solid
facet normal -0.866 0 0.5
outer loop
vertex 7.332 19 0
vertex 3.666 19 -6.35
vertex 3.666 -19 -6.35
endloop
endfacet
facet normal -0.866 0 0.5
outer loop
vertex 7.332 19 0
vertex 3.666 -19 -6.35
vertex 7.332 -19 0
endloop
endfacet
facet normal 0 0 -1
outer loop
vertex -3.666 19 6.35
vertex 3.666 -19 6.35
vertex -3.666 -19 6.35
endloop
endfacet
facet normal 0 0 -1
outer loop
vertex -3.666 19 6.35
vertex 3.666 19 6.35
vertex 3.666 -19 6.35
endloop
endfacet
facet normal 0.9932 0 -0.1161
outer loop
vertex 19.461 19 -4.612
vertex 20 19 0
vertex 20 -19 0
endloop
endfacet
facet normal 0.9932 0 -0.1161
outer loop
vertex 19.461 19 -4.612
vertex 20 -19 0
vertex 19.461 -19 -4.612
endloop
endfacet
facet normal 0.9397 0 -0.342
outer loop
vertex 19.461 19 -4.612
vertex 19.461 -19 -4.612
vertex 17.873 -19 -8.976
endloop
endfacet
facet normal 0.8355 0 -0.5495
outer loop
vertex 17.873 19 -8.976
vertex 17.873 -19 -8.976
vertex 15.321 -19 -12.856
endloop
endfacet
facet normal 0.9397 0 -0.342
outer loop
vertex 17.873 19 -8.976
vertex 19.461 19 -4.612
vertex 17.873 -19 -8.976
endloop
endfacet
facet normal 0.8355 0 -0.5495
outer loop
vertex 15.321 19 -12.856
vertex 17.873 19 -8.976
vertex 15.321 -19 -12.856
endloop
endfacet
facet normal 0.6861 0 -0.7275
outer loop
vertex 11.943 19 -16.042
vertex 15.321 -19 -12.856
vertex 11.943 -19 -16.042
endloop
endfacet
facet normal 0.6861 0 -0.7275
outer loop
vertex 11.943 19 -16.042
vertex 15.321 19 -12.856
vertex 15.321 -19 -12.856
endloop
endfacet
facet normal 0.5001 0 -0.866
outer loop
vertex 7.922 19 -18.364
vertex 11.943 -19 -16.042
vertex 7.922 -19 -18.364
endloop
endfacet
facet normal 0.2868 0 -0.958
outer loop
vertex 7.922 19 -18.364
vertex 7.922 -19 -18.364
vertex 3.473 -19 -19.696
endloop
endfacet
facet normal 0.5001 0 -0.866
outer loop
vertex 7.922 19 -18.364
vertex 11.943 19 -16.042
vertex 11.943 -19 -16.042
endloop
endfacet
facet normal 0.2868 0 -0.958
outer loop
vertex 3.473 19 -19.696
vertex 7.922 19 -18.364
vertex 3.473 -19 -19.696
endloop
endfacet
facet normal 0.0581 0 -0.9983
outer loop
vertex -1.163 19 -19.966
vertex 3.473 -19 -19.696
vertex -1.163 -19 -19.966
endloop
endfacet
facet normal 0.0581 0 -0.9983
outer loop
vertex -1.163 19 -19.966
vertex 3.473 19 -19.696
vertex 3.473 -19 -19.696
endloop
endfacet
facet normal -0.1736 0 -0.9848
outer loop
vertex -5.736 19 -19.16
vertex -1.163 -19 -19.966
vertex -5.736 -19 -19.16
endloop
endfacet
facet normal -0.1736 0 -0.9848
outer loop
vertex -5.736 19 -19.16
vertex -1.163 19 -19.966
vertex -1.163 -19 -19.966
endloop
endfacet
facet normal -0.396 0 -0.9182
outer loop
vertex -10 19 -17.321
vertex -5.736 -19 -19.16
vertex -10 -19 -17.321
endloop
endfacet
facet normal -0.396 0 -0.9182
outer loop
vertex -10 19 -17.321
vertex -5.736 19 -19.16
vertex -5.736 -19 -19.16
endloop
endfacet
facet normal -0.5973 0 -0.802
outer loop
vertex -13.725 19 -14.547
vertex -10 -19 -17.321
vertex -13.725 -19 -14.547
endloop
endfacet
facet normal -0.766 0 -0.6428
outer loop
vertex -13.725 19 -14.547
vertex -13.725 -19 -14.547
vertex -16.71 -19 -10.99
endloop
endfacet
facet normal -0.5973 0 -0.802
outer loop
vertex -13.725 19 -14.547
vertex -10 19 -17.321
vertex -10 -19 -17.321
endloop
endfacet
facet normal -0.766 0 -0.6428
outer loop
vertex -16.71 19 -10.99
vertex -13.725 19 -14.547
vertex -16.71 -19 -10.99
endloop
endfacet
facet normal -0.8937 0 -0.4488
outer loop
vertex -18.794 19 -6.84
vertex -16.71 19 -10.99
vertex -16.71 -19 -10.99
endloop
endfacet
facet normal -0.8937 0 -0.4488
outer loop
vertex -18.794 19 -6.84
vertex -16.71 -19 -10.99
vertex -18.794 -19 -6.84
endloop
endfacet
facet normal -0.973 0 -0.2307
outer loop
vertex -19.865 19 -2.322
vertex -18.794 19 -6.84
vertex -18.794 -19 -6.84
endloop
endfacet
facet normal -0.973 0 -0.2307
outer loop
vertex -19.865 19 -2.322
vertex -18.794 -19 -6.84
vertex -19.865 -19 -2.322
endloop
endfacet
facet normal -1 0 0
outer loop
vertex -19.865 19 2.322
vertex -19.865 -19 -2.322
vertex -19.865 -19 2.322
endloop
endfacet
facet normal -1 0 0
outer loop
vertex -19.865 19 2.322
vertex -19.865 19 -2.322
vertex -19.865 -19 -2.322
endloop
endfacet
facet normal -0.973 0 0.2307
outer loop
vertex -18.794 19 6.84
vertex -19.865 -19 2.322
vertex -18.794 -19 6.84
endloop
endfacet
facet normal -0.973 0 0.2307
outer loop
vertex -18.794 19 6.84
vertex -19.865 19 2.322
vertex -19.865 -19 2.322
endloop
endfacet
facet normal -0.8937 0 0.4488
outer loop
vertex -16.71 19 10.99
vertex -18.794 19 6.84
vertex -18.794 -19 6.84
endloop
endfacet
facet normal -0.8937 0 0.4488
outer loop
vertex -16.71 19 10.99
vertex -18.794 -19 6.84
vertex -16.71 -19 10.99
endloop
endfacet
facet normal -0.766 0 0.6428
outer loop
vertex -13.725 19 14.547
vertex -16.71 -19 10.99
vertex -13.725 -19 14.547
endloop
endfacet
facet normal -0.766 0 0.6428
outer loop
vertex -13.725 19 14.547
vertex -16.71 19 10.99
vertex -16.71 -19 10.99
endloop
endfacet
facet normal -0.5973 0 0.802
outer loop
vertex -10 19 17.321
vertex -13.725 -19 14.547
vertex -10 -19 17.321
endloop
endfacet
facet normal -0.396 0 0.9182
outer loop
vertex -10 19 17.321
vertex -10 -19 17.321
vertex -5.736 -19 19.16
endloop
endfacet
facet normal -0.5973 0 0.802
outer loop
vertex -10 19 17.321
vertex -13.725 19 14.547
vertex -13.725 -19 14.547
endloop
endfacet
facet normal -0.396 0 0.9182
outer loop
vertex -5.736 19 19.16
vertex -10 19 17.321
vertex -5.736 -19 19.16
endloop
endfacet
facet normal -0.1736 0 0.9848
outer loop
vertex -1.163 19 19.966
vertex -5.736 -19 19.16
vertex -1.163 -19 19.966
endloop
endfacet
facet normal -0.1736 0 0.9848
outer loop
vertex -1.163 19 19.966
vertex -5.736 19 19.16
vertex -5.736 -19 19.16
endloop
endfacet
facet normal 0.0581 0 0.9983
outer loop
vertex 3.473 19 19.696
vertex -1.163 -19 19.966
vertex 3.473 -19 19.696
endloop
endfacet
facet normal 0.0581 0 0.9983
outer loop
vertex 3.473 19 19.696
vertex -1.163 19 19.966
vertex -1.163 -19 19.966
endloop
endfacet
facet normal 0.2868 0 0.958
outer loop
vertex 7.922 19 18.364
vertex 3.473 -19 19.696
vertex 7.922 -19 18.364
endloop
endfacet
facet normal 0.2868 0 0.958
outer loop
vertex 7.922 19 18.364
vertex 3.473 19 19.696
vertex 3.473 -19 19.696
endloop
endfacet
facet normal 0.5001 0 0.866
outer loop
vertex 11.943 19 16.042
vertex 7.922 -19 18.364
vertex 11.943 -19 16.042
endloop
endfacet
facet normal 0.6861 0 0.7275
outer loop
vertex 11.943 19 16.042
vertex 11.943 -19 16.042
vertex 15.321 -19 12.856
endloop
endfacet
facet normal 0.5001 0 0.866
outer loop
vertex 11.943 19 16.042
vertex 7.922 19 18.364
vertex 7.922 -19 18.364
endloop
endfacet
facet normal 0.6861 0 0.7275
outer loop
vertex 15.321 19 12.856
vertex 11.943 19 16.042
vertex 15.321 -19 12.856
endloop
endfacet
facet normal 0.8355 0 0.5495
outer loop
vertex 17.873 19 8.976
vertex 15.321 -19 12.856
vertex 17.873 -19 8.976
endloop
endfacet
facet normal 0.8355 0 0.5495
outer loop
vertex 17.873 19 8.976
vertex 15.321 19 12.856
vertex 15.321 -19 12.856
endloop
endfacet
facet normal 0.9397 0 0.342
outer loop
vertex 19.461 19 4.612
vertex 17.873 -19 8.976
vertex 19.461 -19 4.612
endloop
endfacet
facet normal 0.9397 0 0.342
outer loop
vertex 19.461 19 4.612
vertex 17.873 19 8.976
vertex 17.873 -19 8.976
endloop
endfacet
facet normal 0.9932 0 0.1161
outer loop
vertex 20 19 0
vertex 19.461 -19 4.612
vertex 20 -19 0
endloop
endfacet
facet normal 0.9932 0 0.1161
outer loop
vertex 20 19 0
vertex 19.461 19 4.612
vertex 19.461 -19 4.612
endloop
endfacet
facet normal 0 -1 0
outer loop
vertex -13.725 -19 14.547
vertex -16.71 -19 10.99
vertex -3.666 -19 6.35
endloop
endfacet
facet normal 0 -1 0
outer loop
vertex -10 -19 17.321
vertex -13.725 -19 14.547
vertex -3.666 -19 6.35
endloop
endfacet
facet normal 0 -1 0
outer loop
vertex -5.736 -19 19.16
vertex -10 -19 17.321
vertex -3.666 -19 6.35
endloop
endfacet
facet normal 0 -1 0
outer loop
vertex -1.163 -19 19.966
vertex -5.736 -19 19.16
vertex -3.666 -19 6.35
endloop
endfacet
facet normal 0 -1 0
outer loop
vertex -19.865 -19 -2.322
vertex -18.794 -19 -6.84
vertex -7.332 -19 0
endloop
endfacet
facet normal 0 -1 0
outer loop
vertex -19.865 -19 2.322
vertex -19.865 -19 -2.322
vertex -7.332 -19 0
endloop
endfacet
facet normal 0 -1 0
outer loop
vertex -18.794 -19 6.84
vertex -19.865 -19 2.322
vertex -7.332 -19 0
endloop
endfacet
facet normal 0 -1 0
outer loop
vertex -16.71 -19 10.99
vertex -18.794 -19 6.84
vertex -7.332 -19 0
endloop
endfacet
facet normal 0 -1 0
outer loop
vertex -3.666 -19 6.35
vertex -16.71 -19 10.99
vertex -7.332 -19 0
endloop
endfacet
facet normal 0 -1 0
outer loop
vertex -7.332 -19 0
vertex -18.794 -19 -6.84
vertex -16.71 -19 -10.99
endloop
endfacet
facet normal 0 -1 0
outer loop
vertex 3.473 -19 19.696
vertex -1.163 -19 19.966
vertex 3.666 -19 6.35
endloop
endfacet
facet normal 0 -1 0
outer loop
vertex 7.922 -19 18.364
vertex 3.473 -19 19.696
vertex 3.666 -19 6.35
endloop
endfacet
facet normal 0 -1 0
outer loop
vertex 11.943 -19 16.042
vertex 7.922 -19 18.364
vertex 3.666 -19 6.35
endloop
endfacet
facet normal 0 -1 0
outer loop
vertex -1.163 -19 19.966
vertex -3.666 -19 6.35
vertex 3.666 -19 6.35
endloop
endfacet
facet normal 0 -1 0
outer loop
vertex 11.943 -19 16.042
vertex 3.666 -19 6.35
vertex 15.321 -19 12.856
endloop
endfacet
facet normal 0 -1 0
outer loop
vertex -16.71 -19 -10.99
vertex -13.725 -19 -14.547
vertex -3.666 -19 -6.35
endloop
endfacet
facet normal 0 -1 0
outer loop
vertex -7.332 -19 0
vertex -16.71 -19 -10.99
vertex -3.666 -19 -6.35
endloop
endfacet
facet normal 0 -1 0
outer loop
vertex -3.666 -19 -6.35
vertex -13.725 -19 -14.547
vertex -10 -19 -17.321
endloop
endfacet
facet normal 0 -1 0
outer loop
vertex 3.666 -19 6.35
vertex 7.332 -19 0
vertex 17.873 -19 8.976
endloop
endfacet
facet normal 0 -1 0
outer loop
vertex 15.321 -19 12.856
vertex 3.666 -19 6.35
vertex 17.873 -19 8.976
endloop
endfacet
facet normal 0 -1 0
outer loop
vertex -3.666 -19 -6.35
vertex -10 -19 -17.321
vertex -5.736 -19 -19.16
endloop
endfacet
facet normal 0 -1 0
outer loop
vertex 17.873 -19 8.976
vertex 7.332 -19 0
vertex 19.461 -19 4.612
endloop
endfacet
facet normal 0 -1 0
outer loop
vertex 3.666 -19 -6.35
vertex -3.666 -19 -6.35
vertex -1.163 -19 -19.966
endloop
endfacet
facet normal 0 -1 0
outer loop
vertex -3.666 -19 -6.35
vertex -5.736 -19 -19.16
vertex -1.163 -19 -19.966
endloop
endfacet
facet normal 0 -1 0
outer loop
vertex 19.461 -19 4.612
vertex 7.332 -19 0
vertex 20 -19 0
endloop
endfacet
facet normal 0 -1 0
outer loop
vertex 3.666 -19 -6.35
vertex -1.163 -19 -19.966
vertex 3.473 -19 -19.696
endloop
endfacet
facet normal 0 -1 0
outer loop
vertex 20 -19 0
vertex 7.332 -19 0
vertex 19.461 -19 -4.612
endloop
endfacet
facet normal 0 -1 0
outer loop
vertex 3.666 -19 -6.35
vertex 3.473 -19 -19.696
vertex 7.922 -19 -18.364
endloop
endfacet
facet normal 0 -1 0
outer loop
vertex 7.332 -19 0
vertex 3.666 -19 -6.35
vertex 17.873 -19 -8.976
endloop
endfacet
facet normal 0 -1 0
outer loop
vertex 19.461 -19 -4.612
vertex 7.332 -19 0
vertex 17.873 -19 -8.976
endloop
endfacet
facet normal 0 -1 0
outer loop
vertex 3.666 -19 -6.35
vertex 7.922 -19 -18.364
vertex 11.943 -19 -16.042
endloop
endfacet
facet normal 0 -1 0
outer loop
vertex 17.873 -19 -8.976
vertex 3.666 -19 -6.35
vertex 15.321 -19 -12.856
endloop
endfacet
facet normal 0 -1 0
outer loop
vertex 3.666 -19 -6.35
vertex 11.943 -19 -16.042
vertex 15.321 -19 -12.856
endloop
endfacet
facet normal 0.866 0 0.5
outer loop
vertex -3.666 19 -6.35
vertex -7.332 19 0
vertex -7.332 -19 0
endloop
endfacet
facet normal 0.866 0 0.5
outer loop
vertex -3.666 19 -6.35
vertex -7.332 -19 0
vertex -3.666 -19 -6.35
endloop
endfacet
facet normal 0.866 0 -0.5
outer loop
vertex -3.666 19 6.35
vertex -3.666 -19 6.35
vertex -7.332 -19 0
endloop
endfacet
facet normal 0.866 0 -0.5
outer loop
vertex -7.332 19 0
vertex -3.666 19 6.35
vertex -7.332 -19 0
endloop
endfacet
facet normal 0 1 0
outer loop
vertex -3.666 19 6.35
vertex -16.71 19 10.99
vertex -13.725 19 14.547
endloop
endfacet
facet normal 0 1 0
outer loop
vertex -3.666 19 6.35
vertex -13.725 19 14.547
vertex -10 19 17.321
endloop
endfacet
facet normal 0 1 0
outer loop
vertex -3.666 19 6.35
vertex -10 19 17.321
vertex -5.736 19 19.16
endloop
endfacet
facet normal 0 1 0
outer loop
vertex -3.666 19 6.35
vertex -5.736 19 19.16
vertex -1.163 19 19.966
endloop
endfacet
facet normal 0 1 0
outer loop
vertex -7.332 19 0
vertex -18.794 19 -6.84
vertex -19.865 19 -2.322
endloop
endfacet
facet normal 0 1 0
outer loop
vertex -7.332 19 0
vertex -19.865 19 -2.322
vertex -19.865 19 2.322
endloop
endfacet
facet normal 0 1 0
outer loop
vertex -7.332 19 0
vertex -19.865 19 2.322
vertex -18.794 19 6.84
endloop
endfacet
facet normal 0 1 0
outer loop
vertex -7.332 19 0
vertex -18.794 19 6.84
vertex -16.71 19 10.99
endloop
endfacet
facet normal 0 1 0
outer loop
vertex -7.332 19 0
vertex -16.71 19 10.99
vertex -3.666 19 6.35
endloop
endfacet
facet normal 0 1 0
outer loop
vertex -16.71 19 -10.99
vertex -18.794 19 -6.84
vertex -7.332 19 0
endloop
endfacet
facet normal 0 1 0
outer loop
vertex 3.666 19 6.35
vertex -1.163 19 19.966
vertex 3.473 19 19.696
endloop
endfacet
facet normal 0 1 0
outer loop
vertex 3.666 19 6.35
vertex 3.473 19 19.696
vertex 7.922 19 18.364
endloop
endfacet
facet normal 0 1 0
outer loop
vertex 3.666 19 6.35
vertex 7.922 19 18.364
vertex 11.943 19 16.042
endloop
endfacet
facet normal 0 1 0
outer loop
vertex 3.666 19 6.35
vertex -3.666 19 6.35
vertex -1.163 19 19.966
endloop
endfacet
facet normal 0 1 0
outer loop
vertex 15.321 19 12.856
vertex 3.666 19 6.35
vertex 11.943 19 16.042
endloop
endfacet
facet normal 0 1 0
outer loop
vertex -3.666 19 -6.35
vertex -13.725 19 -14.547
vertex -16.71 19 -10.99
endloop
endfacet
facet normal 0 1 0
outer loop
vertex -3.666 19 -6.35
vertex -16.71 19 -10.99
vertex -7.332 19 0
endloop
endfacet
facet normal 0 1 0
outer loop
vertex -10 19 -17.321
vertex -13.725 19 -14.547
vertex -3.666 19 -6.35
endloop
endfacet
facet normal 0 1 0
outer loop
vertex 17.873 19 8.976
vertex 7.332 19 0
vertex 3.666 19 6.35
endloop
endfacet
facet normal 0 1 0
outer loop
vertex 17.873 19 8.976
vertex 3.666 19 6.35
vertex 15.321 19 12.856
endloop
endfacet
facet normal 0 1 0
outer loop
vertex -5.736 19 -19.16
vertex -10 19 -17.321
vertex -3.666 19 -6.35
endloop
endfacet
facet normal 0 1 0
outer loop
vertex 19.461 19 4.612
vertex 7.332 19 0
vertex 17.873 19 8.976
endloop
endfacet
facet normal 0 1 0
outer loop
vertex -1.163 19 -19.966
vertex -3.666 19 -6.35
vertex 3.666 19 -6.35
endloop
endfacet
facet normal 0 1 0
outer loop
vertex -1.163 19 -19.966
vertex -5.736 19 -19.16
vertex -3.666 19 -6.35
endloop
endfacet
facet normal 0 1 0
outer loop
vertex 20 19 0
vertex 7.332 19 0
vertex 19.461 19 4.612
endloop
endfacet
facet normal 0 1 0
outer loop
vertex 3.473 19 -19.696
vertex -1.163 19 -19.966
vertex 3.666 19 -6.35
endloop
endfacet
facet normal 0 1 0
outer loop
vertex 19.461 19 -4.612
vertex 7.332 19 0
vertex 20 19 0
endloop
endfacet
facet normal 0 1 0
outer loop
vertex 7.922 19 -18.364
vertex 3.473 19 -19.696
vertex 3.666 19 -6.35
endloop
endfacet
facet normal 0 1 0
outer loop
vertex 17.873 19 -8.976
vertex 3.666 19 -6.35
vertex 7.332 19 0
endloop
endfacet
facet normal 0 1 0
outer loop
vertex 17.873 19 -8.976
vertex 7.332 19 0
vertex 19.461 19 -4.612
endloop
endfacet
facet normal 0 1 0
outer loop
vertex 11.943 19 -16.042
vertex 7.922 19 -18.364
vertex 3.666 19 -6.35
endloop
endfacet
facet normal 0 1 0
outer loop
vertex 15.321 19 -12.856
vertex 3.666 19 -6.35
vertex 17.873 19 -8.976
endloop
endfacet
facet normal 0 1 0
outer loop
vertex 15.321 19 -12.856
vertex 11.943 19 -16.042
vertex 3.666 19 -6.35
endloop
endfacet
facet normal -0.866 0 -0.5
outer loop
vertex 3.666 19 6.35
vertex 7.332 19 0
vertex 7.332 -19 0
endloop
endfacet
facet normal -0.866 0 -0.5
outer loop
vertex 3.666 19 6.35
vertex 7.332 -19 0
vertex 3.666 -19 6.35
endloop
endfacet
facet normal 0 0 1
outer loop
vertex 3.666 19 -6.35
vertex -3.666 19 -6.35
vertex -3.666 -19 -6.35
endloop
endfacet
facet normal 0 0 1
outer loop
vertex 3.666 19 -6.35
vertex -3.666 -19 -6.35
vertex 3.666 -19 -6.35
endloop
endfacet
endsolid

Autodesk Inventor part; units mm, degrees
ref_plane "YZ Plane" through (0, 0, 0) normal (1, 0, 0) x (0, 1, 0)
ref_plane "XZ Plane" through (0, 0, 0) normal (0, 1, 0) x (-1, 0, 0)
ref_plane "XY Plane" through (0, 0, 0) normal (0, 0, 1) x (1, 0, 0)
surface "Composite1"
sketch "Sketch1" plane through (0, 19, 0) normal (0, 1, 0) x (1, 0, 0)
  line L0 (7.3323, 0) -> (3.6662, -6.35)
  line L1 (3.6662, -6.35) -> (-3.6662, -6.35)
  line L2 (-3.6662, -6.35) -> (-7.3323, 0)
  line L3 (-7.3323, 0) -> (-3.6662, 6.35)
  line L4 (-3.6662, 6.35) -> (3.6662, 6.35)
  line L5 (3.6662, 6.35) -> (7.3323, 0)
  circle A0 centre (0, 0) radius 20
  dimension "d1" = 40
  dimension "d4" = 12.7
extrude "Extrusion1" add sketch "Sketch1" against normal up to surface (38 mm away)
properties part number "gear2"
